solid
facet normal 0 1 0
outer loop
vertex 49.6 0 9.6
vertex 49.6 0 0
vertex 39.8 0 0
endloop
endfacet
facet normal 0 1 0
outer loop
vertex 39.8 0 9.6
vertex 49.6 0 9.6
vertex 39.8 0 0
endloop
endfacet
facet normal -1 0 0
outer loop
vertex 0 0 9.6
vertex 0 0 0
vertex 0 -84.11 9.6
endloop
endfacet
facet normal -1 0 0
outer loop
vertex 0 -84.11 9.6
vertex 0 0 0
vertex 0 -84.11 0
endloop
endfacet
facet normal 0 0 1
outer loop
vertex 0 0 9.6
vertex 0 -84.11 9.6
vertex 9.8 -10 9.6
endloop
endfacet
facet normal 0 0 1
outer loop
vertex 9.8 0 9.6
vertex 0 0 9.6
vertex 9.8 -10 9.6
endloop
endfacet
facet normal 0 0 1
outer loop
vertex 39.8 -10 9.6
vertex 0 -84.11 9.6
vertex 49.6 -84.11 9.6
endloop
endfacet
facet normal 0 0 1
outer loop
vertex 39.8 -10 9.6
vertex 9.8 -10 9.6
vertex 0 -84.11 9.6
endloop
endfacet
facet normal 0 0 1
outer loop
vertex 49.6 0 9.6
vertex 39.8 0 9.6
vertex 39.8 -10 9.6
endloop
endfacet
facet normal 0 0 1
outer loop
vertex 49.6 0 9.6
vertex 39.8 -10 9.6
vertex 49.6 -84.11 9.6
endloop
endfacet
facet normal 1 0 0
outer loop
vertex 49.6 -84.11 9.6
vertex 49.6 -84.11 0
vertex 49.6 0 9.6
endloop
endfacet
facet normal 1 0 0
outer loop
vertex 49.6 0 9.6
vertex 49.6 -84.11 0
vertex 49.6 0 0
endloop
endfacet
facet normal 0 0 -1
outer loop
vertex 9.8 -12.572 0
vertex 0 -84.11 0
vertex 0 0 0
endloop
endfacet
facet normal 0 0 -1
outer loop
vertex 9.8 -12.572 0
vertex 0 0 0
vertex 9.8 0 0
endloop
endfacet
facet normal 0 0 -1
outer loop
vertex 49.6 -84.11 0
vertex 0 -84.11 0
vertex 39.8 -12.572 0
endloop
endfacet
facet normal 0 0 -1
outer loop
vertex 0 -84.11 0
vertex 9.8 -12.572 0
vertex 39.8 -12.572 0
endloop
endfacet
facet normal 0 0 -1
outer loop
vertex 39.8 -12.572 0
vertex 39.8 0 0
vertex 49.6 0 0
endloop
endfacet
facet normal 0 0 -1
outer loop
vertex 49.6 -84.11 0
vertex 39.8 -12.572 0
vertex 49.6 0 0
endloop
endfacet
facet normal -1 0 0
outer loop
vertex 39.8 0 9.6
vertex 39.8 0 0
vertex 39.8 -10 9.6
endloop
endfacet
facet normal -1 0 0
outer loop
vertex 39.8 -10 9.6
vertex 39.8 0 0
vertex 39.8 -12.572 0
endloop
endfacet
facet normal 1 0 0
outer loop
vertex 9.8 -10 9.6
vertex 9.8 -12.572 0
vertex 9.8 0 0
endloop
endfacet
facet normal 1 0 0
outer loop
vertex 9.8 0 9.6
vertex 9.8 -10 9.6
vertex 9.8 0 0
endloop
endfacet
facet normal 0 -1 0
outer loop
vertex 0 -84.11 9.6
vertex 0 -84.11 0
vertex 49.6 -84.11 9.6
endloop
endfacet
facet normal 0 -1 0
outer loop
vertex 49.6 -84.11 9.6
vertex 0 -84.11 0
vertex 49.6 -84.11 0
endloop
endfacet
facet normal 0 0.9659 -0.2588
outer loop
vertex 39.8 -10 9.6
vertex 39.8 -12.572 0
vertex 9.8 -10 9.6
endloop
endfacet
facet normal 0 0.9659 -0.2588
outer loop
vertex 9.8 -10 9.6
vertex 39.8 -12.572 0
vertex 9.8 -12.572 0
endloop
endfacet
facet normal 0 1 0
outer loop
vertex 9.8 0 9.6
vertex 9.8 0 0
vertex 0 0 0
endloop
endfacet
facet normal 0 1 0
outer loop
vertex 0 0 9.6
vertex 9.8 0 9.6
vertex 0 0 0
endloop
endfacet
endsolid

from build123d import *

# Parameters (mm, degrees)
EXTRUDE_1_DEPTH = 9.6
DRAFT_5_ANGLE   = -15


with BuildPart() as part:
    # 草图1 → 凸台-拉伸1 (new body)
    with BuildSketch(Plane.XY):
        Polygon((9.8, 0), (0, 0), (0, -84.11), (49.6, -84.11), (49.6, 0), (39.8, 0), (39.8, -10), (9.8, -10), align=None)
    extrude(amount=EXTRUDE_1_DEPTH)

    # 拔模5
    draft_5_faces = [part.faces().sort_by_distance(p)[0] for p in [
        (24.8, -10, 4.8),
    ]]
    draft(draft_5_faces, Plane.XY.offset(9.6), DRAFT_5_ANGLE)


solid = part.part
